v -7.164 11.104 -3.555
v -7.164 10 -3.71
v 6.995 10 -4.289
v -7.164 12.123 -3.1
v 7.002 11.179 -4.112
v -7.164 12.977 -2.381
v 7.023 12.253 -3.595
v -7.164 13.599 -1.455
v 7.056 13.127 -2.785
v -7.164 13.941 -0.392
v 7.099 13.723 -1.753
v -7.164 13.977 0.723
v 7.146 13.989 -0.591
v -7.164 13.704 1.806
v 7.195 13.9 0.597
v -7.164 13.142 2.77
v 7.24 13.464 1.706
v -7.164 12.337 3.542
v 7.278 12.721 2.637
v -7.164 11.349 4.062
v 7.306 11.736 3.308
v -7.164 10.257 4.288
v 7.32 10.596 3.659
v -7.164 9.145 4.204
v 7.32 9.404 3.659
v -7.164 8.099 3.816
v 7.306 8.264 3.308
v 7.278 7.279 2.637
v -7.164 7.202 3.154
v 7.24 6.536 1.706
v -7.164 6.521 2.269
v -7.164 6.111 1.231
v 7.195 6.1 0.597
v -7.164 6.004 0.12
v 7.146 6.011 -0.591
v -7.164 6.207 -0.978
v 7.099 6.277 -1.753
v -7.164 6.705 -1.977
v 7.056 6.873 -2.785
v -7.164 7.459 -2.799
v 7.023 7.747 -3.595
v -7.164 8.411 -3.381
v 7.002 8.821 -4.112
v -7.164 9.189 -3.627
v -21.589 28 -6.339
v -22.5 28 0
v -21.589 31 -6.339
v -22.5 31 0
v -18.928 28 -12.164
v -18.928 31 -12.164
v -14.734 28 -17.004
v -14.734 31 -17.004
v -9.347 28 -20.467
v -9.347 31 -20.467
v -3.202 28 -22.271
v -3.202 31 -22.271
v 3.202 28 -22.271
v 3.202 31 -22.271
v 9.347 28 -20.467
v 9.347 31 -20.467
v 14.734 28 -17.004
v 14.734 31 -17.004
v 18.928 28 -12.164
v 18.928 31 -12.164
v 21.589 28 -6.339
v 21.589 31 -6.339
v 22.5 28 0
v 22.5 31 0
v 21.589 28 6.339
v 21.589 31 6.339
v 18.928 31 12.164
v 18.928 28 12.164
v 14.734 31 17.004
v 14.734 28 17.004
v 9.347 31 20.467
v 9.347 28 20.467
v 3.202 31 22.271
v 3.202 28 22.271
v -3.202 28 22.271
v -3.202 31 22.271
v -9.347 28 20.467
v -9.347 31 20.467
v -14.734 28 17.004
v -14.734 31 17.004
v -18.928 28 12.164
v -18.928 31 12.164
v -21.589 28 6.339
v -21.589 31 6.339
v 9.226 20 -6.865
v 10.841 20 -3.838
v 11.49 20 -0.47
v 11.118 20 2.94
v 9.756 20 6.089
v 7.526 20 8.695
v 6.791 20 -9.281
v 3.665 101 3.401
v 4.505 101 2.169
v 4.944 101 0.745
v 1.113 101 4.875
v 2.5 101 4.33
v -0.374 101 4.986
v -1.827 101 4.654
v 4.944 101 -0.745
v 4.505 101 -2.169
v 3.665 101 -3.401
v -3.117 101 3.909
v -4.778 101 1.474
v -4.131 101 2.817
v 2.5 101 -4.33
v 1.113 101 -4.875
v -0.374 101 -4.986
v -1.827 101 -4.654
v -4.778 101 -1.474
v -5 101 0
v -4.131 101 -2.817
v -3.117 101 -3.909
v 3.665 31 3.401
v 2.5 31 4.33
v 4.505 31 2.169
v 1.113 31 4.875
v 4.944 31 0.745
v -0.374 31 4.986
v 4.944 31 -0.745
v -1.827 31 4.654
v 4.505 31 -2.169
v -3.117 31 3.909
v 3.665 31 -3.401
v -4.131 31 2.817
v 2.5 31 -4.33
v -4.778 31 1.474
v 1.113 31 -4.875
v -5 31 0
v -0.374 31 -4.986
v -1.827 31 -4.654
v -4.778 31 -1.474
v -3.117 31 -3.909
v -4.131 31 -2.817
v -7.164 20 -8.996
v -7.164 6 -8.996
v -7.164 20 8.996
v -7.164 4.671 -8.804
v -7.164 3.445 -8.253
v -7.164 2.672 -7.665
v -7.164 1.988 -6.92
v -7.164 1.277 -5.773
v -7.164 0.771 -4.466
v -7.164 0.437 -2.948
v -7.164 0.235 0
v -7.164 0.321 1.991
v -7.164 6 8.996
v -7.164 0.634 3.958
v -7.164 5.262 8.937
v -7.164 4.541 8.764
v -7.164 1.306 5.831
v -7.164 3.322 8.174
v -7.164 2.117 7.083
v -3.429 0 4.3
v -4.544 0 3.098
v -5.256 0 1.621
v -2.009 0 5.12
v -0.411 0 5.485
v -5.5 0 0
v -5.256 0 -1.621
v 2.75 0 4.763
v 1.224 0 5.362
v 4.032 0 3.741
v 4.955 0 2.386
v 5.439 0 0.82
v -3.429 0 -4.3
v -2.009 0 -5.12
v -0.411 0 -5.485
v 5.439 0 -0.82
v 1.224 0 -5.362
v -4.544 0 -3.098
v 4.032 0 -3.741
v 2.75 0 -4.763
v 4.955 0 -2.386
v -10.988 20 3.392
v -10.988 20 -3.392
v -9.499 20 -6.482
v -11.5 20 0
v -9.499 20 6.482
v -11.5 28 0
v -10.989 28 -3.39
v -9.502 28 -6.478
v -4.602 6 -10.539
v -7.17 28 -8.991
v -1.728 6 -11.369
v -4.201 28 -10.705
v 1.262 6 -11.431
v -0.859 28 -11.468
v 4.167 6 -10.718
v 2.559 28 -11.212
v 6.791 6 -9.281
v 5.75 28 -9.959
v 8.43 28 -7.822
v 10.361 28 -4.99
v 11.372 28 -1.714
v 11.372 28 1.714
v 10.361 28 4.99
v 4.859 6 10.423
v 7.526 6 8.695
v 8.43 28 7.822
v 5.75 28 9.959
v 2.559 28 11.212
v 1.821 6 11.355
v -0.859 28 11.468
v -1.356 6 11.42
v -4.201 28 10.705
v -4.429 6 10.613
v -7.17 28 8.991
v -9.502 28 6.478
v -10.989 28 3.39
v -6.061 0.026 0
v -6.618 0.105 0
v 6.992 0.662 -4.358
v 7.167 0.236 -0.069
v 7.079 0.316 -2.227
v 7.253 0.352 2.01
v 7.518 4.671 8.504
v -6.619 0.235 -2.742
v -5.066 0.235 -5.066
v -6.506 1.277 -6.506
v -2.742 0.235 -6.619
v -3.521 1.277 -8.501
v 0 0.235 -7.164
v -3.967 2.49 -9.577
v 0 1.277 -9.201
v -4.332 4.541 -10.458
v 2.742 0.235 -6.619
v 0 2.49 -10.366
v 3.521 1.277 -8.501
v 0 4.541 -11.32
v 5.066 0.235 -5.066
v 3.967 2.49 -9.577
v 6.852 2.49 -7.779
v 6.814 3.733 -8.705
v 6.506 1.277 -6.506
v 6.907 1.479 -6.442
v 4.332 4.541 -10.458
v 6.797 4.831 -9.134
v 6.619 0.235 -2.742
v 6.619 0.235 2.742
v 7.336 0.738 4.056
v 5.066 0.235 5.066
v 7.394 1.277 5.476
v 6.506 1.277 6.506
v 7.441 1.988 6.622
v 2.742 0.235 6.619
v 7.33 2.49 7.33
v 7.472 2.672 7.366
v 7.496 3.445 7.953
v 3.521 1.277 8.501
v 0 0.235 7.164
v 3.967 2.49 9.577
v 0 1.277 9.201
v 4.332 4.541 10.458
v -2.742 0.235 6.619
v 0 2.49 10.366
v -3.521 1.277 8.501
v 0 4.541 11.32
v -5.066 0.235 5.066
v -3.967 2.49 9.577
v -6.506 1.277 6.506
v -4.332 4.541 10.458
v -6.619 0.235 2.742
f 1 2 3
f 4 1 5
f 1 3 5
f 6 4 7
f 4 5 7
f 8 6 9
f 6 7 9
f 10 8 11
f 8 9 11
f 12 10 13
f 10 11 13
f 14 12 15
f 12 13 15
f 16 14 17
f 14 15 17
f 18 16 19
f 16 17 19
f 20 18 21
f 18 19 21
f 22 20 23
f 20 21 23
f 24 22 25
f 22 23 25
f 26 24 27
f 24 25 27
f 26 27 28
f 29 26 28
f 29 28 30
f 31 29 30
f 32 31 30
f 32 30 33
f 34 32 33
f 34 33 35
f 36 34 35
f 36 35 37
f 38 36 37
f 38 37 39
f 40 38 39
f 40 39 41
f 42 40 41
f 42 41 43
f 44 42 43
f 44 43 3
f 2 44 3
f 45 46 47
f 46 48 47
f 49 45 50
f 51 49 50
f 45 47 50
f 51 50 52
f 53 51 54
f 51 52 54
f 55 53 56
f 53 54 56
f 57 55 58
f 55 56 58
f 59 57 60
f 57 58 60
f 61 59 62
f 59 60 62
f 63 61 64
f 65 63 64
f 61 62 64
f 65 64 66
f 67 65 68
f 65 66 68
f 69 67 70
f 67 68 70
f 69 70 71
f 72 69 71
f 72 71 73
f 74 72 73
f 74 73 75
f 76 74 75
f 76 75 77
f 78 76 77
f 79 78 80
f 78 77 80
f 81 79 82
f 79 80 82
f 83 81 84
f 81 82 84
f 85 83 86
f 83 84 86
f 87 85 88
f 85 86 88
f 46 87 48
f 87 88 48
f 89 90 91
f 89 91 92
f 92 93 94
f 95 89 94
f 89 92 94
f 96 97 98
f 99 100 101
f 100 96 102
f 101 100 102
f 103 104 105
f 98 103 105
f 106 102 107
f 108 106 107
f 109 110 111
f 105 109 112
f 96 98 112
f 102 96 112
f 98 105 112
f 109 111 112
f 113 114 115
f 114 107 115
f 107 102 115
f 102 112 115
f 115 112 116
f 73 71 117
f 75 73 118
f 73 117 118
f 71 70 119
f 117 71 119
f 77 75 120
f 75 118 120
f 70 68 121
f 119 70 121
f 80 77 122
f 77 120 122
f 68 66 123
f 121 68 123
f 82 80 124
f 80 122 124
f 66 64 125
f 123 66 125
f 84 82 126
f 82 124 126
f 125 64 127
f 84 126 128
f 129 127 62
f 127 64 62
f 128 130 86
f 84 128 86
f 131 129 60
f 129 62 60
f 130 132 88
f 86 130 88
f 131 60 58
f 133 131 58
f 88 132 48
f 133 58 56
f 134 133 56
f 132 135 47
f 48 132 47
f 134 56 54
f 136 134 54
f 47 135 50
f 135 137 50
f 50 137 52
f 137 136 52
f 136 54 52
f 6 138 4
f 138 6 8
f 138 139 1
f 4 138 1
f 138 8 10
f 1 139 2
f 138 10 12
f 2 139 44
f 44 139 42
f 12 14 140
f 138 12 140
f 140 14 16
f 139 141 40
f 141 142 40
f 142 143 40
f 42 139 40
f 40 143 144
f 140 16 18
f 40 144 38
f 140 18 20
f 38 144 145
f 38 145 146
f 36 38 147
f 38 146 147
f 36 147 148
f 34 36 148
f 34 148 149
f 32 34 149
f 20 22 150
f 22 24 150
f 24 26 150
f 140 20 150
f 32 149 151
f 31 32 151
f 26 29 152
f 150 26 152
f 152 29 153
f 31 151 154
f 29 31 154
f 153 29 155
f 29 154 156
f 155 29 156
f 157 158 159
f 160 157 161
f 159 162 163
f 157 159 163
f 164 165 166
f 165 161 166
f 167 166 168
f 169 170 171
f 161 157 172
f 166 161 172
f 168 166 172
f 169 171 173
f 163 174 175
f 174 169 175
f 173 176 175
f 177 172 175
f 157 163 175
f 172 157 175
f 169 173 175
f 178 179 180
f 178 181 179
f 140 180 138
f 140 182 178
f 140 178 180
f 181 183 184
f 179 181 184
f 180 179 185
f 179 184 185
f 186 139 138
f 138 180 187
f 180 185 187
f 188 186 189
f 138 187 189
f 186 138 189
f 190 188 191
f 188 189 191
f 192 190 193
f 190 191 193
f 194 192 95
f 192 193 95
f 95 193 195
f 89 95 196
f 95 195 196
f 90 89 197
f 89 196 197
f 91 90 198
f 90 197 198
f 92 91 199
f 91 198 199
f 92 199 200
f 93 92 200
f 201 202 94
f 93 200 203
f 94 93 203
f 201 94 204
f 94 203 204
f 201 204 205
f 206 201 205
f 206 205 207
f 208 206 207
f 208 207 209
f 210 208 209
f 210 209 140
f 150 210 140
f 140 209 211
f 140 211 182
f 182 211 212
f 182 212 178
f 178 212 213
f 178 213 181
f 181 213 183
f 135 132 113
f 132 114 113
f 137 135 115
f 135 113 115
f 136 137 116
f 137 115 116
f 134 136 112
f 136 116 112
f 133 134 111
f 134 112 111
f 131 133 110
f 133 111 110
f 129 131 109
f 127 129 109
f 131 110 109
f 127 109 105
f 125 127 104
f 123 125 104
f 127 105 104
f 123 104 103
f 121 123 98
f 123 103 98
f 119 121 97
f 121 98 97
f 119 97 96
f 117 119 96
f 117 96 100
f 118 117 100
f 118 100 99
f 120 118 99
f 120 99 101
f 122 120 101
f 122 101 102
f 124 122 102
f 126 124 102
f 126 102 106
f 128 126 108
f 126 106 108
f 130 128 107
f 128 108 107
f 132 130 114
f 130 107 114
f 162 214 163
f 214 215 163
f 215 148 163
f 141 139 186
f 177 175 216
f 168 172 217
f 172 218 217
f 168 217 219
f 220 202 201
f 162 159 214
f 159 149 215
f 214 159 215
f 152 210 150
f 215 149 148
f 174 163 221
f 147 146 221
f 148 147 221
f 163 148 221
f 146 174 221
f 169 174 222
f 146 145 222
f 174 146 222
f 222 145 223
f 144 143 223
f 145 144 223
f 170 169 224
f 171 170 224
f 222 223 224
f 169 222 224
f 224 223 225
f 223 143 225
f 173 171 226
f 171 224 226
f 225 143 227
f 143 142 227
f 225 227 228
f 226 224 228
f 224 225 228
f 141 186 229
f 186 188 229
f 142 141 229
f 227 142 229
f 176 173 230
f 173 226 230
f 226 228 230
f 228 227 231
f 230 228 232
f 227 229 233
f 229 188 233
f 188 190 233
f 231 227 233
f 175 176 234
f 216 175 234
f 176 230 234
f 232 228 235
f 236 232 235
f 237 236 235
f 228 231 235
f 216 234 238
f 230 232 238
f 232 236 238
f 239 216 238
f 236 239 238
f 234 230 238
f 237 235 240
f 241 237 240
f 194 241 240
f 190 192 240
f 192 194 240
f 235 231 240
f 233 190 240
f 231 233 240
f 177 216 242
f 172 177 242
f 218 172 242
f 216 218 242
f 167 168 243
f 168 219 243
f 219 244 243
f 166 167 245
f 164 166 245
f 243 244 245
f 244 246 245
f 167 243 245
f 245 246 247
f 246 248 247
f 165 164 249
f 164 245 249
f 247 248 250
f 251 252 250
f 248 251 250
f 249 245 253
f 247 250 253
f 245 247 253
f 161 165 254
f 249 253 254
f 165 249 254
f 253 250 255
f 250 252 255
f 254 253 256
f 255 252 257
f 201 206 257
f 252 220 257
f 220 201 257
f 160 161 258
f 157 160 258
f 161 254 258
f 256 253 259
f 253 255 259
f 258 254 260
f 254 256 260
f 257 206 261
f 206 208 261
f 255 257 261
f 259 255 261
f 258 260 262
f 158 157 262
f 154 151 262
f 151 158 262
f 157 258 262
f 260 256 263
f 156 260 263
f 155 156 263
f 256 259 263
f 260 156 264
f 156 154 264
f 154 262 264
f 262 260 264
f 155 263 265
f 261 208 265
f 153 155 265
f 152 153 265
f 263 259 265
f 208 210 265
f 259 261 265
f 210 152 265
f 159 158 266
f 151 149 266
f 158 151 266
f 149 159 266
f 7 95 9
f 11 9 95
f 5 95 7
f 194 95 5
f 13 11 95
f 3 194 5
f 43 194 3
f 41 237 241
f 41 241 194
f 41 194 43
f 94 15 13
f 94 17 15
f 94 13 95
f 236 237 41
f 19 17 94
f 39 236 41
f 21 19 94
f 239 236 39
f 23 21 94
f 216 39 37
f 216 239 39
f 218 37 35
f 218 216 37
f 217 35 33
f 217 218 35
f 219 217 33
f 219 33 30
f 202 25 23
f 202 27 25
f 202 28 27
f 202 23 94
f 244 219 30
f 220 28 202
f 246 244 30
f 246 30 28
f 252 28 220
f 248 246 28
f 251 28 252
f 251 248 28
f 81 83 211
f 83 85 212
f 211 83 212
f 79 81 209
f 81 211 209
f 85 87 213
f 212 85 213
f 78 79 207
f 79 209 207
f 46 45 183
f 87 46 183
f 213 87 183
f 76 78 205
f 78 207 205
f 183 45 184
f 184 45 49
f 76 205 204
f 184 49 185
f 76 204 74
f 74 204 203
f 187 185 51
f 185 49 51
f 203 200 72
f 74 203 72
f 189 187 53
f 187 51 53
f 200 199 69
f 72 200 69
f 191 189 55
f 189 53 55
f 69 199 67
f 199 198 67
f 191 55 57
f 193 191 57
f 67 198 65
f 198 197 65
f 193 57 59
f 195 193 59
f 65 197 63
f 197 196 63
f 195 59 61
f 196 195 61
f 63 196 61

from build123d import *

# Parameters (mm, degrees)
FILLET1_R          = 6
SKETCH2_W          = 7.935978024
SKETCH2_H          = 33.147969744
CUT_EXTRUDE1_DEPTH = 20
SKETCH3_R          = 4
CUT_EXTRUDE2_DEPTH = 108.70389036


with BuildPart() as part:
    # Sketch1 → Revolve1 (revolve)
    with BuildSketch(Plane.XY, mode=Mode.PRIVATE) as revolve1_sk:
        Polygon((0, 0), (11.5, 0), (11.5, 28), (22.5, 28), (22.5, 31), (5, 31), (5, 101), (0, 101), align=None)
    revolve(revolve1_sk.sketch.rotate(Axis((0, 101, 0), (0, -1, 0)), 180), axis=Axis((0, 101, 0), (0, -1, 0)))

    # Fillet1
    fillet1_edges = [part.edges().sort_by_distance(p)[0] for p in [
        (11.5, 0, 0),
    ]]
    fillet(fillet1_edges, radius=FILLET1_R)

    # Sketch2 → Cut-Extrude1 (cut)
    with BuildSketch(Plane.XZ):
        Polygon((15.765034156, 15.943007174), (14.41031705, -17.177268183), (6.480969359, -16.852934437), (7.835686465, 16.26734092), align=None)
        with Locations((-11.132302547, 0)):
            Rectangle(SKETCH2_W, SKETCH2_H)
    extrude(amount=-CUT_EXTRUDE1_DEPTH, mode=Mode.SUBTRACT)

    # Sketch3 → Cut-Extrude2 (cut, through all)
    with BuildSketch(Plane(origin=(7.158327912, 0, -0.292796759), x_dir=(-0.040868780695827604, 0, -0.9991645223707837), z_dir=(0.9991645223707837, 0, -0.040868780695827604))):
        with Locations((0, 10)):
            Circle(SKETCH3_R)
    extrude(amount=-CUT_EXTRUDE2_DEPTH, mode=Mode.SUBTRACT)


solid = part.part
